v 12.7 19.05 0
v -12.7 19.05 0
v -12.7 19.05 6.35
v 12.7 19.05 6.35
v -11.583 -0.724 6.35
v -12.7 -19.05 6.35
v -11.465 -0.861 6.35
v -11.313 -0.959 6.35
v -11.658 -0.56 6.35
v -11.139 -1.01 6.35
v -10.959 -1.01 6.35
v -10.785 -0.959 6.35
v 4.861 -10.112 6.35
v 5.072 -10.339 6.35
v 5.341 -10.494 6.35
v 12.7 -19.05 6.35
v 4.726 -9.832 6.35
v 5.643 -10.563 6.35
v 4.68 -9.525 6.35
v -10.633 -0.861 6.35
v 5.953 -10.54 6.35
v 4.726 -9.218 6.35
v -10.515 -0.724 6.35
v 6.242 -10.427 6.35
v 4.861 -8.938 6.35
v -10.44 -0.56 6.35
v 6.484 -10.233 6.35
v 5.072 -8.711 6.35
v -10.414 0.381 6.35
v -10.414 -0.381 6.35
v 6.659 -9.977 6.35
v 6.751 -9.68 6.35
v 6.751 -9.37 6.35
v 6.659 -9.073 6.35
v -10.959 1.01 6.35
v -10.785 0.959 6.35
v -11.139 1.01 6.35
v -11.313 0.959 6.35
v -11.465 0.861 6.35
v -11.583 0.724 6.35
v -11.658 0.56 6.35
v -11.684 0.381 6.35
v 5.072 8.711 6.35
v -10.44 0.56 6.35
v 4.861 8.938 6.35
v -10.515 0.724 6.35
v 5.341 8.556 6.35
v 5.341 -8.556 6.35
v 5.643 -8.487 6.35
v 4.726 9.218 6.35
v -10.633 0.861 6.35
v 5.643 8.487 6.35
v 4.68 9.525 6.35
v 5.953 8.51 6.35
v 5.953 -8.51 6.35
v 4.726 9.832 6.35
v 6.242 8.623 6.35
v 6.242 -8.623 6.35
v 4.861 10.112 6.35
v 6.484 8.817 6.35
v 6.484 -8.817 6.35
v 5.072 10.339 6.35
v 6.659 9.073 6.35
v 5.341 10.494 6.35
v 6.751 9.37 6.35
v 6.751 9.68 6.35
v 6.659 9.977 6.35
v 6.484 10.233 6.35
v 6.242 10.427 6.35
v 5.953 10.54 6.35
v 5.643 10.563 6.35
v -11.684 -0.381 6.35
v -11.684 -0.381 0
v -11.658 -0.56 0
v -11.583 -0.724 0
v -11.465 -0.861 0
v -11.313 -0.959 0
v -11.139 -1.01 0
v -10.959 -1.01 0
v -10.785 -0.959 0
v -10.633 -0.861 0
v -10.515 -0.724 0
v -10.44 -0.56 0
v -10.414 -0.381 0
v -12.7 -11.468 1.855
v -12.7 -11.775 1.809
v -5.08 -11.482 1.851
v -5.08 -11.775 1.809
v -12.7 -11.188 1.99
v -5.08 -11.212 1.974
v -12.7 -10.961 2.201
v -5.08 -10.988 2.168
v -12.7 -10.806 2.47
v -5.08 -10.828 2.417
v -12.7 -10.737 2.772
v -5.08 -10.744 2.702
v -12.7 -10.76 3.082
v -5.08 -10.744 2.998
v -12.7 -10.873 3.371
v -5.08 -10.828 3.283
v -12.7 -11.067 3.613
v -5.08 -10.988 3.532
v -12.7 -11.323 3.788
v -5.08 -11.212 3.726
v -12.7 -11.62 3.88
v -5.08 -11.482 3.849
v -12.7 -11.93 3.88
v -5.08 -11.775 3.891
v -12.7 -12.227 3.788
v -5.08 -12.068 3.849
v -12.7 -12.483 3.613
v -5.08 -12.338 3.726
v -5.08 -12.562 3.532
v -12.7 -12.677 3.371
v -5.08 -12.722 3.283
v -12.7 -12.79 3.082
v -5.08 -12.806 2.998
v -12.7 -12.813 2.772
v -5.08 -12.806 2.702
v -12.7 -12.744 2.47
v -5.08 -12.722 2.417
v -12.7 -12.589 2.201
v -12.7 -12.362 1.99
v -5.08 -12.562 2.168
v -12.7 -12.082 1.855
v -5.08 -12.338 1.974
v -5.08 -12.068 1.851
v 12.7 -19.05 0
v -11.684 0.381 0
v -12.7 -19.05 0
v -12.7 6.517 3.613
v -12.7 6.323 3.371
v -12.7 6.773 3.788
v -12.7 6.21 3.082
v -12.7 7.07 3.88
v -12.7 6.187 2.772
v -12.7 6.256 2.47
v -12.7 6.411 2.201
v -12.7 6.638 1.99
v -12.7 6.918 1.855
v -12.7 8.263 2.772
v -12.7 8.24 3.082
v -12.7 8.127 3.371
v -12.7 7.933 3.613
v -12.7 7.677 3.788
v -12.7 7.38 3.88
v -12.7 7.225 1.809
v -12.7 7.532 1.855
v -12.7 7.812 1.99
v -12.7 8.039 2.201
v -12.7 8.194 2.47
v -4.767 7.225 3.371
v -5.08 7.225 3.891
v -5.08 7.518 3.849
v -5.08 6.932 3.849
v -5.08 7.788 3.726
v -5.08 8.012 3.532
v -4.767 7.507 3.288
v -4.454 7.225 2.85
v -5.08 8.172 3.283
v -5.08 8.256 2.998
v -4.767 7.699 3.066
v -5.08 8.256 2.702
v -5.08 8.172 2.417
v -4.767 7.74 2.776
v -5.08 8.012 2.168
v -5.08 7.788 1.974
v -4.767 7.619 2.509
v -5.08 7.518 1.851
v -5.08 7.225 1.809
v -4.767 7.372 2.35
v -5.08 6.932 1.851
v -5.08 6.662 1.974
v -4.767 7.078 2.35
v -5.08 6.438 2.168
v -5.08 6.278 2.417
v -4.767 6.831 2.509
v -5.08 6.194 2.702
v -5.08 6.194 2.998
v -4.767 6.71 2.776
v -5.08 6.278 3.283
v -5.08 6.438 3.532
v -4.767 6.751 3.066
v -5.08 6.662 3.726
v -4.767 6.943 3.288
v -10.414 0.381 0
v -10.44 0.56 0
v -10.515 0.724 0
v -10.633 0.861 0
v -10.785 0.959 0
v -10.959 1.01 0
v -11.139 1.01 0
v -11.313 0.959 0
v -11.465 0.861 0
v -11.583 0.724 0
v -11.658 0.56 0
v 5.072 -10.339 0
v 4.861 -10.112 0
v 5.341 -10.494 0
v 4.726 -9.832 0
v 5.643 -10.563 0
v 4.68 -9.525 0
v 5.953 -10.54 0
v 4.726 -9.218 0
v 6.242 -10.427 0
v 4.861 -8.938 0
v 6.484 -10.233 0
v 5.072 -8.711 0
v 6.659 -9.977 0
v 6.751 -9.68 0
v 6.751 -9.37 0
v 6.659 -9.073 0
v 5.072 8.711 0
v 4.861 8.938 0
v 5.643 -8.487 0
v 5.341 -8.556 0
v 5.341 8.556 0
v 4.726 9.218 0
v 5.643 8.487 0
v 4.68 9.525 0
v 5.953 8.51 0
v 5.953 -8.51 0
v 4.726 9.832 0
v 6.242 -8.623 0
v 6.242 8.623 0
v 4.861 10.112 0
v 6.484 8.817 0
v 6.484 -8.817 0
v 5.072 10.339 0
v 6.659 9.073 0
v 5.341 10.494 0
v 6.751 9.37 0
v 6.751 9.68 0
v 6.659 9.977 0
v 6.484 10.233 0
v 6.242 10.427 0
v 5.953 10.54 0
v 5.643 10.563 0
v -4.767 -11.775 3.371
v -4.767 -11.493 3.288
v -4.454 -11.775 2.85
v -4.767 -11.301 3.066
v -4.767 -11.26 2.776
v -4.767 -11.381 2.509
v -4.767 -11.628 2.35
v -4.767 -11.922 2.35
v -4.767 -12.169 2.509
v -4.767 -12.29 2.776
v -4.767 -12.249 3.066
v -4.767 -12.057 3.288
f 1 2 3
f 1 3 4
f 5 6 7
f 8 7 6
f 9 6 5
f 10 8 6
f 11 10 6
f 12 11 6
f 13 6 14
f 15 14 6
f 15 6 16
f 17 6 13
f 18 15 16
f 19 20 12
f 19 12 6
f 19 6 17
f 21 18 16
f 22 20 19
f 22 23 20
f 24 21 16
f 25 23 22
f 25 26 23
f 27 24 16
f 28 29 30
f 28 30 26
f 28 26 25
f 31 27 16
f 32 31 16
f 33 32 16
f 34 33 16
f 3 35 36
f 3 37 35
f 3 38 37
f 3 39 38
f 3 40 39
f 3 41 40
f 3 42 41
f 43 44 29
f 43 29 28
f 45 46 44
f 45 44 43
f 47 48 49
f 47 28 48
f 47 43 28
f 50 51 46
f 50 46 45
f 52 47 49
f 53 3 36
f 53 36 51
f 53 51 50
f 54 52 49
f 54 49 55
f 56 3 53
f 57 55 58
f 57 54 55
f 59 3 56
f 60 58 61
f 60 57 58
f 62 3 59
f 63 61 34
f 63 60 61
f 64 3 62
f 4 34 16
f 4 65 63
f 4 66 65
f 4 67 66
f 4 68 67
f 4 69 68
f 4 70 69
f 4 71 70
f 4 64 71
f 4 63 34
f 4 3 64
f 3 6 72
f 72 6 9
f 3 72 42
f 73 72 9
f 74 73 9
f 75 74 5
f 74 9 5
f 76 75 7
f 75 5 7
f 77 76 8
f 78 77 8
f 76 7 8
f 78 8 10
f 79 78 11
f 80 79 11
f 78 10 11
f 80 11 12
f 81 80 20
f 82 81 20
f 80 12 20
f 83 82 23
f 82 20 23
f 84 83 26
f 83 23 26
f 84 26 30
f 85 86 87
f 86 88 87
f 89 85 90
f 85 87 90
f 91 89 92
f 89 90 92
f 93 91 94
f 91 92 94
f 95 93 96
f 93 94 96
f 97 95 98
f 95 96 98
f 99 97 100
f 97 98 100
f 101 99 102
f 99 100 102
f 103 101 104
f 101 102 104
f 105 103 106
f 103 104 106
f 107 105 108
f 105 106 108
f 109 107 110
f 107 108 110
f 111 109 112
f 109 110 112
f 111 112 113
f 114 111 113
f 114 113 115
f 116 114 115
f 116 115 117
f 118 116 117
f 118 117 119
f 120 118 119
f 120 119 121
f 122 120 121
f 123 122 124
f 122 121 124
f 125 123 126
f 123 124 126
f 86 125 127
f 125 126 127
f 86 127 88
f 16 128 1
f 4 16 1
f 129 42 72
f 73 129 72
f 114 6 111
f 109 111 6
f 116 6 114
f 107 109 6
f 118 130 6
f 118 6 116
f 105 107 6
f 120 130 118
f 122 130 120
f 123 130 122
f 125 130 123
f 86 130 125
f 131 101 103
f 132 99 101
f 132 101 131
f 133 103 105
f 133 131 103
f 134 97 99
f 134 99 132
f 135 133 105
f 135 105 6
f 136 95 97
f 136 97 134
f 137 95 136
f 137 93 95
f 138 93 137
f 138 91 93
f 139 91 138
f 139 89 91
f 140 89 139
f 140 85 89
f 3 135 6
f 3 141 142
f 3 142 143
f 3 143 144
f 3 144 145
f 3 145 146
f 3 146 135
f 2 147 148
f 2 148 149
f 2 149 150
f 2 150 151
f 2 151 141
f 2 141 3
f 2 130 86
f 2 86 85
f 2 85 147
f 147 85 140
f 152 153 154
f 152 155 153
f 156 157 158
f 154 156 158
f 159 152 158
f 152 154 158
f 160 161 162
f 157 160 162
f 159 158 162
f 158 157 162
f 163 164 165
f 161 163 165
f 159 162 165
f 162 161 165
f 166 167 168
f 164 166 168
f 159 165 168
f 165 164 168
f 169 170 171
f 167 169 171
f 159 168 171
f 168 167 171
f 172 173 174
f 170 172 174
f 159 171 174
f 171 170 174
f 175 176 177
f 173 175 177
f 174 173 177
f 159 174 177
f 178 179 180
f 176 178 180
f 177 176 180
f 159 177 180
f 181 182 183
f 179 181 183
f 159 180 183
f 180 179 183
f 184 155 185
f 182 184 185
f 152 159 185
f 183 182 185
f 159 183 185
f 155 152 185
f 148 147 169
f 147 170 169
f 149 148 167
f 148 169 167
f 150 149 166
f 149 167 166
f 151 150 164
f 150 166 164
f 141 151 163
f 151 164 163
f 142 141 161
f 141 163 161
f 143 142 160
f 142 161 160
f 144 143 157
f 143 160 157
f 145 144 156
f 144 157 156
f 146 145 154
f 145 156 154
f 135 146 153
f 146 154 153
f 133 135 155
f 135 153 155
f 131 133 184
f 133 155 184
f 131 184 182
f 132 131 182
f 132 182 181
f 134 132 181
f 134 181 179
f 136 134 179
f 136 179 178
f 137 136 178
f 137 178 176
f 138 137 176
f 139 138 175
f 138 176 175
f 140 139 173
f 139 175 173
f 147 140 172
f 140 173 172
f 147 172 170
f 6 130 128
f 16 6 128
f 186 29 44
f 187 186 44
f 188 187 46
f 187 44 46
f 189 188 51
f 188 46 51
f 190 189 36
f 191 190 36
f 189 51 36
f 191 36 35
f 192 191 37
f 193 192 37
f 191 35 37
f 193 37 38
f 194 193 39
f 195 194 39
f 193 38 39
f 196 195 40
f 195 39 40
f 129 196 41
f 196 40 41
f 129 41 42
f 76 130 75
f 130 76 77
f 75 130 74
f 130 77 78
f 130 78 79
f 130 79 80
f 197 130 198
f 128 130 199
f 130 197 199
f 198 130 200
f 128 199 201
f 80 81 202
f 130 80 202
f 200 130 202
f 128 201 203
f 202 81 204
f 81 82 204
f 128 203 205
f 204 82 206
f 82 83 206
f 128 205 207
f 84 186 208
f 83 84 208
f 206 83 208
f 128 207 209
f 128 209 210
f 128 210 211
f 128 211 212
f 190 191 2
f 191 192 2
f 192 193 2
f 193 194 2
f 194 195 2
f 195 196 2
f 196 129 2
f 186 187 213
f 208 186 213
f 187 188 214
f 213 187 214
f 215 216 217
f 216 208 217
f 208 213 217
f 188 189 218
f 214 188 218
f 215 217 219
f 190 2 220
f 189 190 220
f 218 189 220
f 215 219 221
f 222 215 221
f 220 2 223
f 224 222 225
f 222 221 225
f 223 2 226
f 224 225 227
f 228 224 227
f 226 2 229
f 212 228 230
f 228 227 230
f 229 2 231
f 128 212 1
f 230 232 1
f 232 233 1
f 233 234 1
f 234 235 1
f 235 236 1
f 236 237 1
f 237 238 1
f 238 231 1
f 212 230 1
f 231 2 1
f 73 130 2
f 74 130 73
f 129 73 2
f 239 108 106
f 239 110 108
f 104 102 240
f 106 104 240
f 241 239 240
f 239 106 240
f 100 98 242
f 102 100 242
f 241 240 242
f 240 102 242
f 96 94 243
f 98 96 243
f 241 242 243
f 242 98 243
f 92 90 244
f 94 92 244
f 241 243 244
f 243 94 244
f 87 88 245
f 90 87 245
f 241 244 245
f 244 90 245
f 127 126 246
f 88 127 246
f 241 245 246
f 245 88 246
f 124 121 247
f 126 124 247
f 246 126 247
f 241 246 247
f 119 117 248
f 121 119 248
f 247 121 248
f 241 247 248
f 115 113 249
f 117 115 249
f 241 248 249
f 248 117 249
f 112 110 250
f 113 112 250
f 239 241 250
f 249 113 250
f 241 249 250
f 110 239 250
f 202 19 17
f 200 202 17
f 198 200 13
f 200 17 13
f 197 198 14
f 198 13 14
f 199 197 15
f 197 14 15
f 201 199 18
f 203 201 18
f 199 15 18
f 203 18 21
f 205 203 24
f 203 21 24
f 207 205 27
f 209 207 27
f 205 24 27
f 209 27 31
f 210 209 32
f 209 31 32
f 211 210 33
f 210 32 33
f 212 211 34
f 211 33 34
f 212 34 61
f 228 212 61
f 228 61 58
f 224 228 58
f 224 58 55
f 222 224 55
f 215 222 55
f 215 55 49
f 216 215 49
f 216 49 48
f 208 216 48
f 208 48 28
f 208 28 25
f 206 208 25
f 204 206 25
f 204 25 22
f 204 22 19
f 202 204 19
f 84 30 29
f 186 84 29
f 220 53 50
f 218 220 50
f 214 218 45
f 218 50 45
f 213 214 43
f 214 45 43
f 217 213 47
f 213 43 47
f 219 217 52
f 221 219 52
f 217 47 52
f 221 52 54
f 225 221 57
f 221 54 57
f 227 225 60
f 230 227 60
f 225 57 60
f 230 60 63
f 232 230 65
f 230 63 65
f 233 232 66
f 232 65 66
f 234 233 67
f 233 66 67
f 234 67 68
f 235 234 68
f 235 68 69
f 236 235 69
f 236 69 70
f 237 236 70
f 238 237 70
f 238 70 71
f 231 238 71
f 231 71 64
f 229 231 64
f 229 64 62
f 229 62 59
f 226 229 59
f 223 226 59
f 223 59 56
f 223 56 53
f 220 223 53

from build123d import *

# Parameters (mm, degrees)
SKETCH1_W                     = 25.4
SKETCH1_H                     = 38.1
BOSS_EXTRUDE1_DEPTH           = 6.35
TAP_DRILL_FOR_3_56_TAP1_D     = 2.0828
TAP_DRILL_FOR_3_56_TAP1_DEPTH = 7.62
TAP_DRILL_FOR_3_56_TAP1_TIP   = 0.625736249
CUT_EXTRUDE1_DEPTH            = 7.35
TAP_DRILL_FOR_3_56_TAP2_D     = 2.0828
TAP_DRILL_FOR_3_56_TAP2_DEPTH = 7.62
TAP_DRILL_FOR_3_56_TAP2_TIP   = 0.625736249


with BuildPart() as part:
    # Sketch1 → Boss-Extrude1 (new body)
    with BuildSketch(Plane.XY):
        Rectangle(SKETCH1_W, SKETCH1_H)
    extrude(amount=BOSS_EXTRUDE1_DEPTH)

    # Tap Drill for #3-56 Tap1
    with Locations(Plane.ZY.offset(12.7)):
        with Locations((2.850000016, 7.224999934), (2.84999953, -11.775000065)):
            Hole(TAP_DRILL_FOR_3_56_TAP1_D / 2, depth=TAP_DRILL_FOR_3_56_TAP1_DEPTH)
            with Locations((0, 0, -(TAP_DRILL_FOR_3_56_TAP1_DEPTH + TAP_DRILL_FOR_3_56_TAP1_TIP / 2))):  # 118° drill point
                Cone(0, TAP_DRILL_FOR_3_56_TAP1_D / 2, TAP_DRILL_FOR_3_56_TAP1_TIP, mode=Mode.SUBTRACT)

    # Sketch4 → Cut-Extrude1 (cut, through all)
    with BuildSketch(Plane.XY.offset(6.35)):
        with BuildLine():
            Line((-10.414, -0.381), (-10.414, 0.381))
            ThreePointArc((-10.414, 0.381), (-11.049, 1.016), (-11.684, 0.381))
            Line((-11.684, 0.381), (-11.684, -0.381))
            ThreePointArc((-11.684, -0.381), (-11.049, -1.016), (-10.414, -0.381))
        make_face()
    extrude(amount=-CUT_EXTRUDE1_DEPTH, mode=Mode.SUBTRACT)

    # Tap Drill for #3-56 Tap2
    with Locations(Plane(origin=(0, 0, 0), x_dir=(1, 0, 0), z_dir=(0, 0, -1))):
        with Locations((5.721, -9.525), (5.721, 9.525)):
            Hole(TAP_DRILL_FOR_3_56_TAP2_D / 2, depth=TAP_DRILL_FOR_3_56_TAP2_DEPTH)
            with Locations((0, 0, -(TAP_DRILL_FOR_3_56_TAP2_DEPTH + TAP_DRILL_FOR_3_56_TAP2_TIP / 2))):  # 118° drill point
                Cone(0, TAP_DRILL_FOR_3_56_TAP2_D / 2, TAP_DRILL_FOR_3_56_TAP2_TIP, mode=Mode.SUBTRACT)


solid = part.part
